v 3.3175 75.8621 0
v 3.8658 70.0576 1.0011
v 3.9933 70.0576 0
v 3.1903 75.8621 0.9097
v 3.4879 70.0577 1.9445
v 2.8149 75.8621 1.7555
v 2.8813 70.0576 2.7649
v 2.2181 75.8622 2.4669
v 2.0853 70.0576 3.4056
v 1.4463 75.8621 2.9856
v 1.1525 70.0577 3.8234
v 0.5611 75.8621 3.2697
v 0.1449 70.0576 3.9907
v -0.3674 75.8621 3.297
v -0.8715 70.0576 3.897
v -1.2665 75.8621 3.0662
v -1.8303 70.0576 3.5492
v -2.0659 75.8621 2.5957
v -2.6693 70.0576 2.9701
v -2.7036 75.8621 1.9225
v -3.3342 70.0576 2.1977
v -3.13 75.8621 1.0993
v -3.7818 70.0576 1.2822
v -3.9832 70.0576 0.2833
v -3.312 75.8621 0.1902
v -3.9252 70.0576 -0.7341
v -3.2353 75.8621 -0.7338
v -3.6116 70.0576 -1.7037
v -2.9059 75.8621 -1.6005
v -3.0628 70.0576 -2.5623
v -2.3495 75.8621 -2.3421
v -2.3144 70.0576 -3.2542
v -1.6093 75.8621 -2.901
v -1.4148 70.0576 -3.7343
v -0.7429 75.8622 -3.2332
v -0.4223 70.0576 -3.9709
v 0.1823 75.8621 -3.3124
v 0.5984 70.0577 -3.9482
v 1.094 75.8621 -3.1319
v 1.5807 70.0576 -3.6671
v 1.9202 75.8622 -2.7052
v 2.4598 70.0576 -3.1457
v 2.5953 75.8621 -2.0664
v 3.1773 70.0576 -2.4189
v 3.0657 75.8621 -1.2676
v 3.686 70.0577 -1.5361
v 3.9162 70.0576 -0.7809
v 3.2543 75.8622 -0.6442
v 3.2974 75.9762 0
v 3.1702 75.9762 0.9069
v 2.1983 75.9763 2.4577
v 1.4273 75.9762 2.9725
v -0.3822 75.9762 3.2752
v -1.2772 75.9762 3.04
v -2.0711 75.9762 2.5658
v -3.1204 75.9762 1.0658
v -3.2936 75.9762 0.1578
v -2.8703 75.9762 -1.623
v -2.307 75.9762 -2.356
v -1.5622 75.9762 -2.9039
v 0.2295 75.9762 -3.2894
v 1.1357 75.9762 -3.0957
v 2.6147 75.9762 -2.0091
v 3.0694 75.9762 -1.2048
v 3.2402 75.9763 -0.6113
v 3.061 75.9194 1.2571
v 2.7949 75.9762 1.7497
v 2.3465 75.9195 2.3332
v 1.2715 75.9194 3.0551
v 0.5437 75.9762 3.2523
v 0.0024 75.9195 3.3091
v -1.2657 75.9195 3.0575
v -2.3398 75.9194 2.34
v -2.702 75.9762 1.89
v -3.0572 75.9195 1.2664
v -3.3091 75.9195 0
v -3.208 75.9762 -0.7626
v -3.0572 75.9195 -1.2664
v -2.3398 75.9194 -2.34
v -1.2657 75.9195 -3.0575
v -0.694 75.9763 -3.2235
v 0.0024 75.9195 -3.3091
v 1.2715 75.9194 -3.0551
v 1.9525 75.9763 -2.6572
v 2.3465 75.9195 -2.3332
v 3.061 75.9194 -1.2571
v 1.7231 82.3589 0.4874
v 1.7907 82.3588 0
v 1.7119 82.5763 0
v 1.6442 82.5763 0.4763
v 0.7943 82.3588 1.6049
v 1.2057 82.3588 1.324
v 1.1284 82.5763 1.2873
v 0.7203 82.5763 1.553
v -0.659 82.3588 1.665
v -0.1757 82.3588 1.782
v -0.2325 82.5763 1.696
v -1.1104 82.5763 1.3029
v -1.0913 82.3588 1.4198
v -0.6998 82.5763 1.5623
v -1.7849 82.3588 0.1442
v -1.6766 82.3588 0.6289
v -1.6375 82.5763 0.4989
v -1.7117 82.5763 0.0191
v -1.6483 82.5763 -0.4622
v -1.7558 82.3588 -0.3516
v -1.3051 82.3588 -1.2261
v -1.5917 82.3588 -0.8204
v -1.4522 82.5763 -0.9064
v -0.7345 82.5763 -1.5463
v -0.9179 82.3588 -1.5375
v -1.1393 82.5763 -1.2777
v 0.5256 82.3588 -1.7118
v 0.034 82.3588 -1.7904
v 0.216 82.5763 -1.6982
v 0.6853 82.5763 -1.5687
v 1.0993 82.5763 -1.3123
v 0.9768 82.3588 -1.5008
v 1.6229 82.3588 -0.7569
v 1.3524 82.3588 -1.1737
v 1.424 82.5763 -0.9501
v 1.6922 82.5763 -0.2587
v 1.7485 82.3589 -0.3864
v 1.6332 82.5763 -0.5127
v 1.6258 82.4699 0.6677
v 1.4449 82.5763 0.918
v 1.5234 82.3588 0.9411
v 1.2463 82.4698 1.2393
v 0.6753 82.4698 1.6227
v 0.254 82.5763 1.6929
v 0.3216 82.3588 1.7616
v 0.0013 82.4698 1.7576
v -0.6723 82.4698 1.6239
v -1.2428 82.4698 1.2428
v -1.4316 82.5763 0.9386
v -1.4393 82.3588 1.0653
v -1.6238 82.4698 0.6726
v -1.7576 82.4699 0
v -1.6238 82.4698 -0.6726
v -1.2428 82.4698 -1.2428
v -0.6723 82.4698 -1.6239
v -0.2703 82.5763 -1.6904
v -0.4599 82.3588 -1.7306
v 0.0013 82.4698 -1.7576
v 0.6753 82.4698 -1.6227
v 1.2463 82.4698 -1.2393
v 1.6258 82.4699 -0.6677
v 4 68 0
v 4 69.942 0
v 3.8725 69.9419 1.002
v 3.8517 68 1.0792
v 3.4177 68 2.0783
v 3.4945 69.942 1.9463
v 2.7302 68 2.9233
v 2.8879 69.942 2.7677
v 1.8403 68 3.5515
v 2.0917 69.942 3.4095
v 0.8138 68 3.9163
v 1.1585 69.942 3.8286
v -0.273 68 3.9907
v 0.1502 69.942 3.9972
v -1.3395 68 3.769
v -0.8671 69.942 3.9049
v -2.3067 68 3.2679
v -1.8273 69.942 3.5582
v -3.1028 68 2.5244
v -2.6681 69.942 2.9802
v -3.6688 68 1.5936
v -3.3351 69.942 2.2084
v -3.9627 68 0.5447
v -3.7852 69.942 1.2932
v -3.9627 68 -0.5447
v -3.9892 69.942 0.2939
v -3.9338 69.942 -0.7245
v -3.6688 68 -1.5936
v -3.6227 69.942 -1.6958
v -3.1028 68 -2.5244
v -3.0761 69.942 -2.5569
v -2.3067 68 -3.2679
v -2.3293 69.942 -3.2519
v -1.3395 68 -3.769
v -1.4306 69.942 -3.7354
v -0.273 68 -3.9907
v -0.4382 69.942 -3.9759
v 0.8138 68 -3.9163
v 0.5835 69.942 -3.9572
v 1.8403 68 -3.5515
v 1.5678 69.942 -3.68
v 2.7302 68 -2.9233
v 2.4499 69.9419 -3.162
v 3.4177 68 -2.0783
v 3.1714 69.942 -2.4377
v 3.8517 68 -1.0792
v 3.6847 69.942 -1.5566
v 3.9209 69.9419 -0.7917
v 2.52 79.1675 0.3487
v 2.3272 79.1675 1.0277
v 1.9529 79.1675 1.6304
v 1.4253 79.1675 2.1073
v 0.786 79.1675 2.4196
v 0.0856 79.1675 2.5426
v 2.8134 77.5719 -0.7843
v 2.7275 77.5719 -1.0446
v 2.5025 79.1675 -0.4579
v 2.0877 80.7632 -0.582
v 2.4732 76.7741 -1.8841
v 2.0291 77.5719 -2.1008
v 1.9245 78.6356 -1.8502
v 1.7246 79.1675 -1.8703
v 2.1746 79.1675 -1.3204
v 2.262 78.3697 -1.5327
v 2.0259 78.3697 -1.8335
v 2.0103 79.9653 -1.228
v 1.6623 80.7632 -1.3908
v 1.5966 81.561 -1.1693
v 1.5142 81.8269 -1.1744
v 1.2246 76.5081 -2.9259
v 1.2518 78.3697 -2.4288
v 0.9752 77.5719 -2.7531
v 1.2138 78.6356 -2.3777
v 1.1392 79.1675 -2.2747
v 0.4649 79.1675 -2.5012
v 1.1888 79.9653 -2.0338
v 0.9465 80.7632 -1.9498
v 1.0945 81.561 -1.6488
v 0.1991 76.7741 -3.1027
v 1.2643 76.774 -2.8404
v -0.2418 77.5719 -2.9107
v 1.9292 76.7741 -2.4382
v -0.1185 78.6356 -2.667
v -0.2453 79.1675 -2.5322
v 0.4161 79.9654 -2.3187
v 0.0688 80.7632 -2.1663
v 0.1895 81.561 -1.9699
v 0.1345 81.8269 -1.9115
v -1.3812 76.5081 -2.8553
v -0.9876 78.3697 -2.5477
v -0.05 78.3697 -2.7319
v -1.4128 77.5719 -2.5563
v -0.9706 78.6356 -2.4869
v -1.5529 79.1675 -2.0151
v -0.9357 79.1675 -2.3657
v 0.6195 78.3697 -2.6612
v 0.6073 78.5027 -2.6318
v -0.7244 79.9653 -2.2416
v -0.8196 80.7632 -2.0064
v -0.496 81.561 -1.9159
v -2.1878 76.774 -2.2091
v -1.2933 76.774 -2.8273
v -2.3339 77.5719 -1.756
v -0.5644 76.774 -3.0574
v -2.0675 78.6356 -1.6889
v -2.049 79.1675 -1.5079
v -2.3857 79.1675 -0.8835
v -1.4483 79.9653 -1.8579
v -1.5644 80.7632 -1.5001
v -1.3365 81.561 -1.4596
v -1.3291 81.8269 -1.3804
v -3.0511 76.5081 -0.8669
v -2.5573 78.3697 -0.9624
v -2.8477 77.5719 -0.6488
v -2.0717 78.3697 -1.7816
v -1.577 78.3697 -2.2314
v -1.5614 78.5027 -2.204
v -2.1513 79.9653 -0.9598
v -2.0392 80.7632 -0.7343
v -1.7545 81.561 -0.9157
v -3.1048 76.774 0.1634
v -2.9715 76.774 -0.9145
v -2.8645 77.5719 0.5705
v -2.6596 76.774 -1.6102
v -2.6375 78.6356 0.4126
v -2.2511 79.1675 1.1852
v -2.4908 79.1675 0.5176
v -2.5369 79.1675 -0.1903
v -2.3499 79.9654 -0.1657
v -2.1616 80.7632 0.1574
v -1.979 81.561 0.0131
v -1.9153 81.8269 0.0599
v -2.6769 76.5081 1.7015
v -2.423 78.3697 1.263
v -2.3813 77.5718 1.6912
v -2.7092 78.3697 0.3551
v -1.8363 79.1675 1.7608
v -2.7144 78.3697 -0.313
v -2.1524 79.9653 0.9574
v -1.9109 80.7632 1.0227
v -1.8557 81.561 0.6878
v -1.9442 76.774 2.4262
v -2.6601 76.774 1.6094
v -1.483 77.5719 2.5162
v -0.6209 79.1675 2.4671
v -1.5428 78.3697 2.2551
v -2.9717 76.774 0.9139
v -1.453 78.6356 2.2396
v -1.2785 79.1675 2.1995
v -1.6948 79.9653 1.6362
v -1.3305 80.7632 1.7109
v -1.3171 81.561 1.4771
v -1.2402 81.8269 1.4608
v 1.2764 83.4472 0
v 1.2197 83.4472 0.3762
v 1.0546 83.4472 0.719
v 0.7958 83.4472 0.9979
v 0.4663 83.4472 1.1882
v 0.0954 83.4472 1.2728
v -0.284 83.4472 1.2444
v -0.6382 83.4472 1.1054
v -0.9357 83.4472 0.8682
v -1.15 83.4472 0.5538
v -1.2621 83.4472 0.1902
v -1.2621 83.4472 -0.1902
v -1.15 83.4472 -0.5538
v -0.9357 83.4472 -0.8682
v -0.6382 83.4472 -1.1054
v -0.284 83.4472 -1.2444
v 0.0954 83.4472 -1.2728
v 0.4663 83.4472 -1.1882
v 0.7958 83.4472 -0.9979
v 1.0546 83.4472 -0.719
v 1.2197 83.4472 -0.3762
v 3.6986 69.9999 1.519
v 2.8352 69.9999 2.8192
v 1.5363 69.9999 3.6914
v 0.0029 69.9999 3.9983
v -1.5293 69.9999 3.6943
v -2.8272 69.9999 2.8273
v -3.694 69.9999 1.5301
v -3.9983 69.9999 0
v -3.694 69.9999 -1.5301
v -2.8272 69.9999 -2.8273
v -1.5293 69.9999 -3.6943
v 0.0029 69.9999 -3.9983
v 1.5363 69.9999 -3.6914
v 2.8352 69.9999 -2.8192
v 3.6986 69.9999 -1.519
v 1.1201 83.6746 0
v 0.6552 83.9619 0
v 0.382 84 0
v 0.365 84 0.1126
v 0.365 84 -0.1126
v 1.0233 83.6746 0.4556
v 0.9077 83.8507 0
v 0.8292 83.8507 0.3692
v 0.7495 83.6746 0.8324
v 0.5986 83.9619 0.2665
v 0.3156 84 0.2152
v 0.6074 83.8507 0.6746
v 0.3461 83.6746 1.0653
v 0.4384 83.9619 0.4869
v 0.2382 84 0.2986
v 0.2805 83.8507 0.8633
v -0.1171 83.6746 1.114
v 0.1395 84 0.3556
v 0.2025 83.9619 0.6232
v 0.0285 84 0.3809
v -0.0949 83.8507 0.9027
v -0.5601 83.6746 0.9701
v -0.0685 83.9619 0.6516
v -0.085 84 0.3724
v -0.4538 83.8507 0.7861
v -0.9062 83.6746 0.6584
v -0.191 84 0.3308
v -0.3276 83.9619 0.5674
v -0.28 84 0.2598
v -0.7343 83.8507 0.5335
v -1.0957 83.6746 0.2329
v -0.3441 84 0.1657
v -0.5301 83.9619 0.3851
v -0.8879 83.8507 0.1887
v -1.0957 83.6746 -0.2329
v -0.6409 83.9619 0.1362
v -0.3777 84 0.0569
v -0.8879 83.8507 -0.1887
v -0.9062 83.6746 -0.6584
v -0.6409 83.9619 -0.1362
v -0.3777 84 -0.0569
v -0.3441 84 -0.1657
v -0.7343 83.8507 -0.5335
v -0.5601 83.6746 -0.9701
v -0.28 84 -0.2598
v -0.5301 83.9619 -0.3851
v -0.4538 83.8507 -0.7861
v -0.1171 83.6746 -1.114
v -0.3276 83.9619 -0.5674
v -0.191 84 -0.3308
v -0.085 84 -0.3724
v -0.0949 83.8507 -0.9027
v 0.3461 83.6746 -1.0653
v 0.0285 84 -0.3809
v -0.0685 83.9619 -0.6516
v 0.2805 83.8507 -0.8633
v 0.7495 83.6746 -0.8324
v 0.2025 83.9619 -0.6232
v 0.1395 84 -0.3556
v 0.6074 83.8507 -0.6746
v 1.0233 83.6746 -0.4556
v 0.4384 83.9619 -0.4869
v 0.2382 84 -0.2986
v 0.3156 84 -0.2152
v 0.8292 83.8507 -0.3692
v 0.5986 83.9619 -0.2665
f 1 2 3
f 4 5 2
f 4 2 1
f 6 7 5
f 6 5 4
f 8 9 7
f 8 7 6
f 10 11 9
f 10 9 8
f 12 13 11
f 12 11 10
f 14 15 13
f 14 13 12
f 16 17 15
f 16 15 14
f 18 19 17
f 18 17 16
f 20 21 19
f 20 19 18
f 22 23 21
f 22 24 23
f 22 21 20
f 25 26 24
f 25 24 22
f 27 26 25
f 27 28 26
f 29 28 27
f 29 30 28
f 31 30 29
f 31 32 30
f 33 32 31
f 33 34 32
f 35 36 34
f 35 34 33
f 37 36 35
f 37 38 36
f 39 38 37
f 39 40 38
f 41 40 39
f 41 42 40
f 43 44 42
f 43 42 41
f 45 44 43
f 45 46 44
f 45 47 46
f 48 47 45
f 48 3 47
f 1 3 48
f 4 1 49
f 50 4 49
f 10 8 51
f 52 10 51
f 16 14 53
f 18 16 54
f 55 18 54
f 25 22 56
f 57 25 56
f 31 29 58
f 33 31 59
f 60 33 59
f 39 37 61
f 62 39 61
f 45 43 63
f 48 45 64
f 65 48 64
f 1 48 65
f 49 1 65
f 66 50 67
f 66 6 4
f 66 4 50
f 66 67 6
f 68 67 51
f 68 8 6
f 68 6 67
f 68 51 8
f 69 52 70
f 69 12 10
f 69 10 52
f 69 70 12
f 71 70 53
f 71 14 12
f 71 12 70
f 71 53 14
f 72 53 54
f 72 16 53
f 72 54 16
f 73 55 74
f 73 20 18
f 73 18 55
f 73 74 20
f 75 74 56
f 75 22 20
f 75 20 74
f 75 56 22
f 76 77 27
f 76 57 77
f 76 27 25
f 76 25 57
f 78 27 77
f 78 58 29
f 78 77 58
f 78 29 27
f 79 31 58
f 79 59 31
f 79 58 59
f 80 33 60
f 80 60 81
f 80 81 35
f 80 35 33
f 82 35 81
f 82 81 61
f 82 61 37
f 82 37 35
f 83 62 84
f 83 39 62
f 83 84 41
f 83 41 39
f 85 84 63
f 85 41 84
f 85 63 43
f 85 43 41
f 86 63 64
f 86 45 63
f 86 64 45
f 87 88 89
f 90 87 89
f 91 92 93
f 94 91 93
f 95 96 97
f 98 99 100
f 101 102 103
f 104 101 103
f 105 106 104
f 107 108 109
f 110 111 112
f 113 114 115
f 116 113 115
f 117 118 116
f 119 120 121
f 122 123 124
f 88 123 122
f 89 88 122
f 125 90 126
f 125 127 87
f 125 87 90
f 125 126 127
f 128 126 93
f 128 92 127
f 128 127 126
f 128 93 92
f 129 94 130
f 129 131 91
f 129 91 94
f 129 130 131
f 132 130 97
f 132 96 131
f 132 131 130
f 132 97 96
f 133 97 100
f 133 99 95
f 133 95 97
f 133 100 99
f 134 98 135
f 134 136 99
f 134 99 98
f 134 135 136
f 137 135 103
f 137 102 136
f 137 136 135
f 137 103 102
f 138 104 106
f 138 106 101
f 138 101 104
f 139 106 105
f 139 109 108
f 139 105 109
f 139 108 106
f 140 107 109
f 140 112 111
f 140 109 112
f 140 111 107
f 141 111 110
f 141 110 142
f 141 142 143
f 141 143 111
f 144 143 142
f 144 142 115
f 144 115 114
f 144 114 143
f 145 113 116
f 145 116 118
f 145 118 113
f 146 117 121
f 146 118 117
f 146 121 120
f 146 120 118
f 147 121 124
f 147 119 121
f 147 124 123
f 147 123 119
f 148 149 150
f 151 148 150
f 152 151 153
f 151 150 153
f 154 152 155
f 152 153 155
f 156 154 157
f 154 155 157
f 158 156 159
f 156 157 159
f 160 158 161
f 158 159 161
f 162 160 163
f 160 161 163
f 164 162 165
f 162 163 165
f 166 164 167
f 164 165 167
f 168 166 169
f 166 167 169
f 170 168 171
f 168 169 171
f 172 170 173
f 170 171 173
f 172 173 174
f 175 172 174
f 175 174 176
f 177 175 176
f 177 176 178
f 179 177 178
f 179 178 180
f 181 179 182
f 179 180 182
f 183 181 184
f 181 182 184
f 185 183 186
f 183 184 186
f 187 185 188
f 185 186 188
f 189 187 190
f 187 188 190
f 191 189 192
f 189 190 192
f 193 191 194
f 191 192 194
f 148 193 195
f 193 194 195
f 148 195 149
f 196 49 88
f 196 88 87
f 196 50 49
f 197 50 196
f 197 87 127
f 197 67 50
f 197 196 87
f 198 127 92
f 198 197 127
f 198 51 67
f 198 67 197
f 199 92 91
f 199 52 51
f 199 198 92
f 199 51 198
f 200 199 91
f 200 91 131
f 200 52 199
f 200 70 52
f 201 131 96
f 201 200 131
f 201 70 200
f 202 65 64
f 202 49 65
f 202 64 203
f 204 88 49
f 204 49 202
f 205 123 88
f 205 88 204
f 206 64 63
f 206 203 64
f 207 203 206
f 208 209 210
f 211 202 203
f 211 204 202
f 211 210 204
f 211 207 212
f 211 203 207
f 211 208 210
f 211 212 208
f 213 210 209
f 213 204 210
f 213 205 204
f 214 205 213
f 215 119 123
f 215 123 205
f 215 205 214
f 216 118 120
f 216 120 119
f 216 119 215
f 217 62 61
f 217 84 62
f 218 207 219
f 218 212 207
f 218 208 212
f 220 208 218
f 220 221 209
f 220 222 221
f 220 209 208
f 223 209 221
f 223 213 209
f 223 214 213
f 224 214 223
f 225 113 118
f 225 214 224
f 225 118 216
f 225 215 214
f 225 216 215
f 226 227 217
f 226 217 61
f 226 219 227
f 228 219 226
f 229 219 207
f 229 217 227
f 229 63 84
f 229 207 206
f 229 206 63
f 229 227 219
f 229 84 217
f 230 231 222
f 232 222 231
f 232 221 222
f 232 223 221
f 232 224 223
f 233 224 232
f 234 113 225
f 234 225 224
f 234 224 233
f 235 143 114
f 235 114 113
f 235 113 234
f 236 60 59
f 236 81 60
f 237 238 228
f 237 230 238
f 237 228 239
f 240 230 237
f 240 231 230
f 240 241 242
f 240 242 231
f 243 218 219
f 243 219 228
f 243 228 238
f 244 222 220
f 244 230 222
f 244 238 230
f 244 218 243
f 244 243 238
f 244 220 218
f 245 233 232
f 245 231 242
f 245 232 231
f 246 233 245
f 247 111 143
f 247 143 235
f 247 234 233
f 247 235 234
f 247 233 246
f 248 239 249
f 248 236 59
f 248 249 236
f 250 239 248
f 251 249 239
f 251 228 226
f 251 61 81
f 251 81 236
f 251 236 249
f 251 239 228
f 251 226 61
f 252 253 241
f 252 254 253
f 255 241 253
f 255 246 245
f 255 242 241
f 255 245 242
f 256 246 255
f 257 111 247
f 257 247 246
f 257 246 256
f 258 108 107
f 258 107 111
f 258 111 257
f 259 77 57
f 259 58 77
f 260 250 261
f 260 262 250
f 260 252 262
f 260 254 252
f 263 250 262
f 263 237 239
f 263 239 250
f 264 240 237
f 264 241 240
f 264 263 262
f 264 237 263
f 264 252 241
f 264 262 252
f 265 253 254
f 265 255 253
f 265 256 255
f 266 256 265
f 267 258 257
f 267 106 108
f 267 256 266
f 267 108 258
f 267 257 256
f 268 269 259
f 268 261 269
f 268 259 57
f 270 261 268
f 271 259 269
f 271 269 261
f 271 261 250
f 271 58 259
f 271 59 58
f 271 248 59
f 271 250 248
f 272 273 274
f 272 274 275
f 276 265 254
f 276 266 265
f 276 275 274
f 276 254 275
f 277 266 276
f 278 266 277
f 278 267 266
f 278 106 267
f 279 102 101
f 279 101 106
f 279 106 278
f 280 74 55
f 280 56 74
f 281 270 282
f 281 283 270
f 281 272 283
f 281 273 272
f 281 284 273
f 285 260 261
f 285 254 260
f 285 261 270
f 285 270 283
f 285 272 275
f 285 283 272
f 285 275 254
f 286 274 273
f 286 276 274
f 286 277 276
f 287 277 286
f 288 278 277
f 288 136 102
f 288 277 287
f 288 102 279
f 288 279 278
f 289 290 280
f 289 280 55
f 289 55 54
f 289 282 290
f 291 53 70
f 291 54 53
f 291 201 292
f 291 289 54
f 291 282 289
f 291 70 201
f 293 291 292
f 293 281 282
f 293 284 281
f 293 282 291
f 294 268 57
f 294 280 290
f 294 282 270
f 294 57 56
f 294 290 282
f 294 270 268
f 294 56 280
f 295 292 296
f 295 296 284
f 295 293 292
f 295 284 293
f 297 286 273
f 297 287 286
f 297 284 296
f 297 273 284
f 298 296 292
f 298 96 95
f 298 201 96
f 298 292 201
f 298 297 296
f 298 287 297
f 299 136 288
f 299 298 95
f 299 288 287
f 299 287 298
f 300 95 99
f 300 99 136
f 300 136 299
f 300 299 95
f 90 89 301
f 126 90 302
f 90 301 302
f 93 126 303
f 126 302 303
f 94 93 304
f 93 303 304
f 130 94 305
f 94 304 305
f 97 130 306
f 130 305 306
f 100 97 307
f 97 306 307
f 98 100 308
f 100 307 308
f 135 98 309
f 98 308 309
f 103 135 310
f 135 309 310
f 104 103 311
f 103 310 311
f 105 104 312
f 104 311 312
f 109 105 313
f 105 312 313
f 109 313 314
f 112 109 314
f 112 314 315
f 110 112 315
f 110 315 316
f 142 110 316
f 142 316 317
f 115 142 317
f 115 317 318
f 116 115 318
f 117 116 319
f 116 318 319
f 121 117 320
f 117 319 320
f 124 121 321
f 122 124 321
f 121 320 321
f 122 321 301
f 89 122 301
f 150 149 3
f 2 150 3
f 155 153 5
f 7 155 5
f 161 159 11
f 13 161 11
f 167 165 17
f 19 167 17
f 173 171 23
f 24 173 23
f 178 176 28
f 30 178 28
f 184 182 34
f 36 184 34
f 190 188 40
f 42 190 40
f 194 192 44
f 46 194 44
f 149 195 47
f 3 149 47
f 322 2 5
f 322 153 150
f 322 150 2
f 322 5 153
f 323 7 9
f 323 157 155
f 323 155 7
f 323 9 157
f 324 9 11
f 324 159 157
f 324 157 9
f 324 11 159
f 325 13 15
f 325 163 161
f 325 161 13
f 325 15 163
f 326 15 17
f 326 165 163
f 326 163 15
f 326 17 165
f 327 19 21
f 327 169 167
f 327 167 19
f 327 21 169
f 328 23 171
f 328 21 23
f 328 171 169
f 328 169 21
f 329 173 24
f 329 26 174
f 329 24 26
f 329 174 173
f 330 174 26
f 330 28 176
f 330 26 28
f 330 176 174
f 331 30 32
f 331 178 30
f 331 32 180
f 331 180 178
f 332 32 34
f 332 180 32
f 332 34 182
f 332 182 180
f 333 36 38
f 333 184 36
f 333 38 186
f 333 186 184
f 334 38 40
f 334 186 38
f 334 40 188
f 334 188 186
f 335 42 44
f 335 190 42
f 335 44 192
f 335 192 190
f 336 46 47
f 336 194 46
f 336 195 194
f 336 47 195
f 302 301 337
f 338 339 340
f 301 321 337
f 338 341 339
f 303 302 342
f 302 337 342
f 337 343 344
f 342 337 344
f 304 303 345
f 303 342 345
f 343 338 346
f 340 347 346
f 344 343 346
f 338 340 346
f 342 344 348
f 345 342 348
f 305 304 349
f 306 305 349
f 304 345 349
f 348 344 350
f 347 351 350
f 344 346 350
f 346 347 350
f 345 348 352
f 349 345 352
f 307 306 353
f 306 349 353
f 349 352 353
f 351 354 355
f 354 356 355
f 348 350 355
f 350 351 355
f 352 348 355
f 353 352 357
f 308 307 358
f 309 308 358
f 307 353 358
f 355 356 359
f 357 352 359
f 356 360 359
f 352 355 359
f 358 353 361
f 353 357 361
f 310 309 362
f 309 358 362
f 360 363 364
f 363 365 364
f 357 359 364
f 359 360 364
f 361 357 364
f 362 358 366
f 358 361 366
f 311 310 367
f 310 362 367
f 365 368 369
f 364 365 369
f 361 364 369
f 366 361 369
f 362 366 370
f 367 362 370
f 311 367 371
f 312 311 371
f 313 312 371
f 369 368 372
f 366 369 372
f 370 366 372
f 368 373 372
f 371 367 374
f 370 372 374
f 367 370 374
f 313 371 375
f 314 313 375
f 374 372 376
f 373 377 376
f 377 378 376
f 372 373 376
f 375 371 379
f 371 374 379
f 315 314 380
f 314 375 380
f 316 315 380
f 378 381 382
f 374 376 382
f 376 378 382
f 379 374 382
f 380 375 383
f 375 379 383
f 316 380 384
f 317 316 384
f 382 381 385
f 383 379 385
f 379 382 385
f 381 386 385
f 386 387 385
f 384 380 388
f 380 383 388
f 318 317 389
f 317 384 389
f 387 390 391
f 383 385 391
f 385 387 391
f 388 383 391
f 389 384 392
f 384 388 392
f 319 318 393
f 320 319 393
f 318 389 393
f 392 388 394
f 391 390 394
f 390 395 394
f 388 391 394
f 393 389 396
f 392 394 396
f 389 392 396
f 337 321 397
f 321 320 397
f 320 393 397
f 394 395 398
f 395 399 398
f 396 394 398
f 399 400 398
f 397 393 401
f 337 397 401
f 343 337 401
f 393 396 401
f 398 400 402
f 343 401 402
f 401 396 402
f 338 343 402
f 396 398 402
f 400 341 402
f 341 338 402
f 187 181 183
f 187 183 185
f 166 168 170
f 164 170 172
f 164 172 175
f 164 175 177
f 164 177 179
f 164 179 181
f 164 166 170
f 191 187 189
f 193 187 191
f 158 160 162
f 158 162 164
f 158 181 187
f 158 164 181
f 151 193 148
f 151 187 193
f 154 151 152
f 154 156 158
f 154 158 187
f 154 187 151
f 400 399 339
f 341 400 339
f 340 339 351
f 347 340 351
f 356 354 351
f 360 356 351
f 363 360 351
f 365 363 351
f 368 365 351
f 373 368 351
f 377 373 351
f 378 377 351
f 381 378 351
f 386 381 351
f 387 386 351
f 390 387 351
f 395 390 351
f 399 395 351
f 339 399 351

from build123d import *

# Parameters (mm, degrees)
CYLINDER046_R     = 4
CYLINDER046_DEPTH = 16
CHAMFER010_SIZE2  = 3
CHAMFER010_SIZE   = 6
CHAMFER011_SIZE   = 5
CHAMFER012_SIZE   = 3
FILLET003_R       = 1


with BuildPart() as part:
    # Cylinder046 → Cylinder046 (new body)
    with BuildSketch(Plane.XZ.offset(-60)):
        Circle(CYLINDER046_R)
    extrude(amount=CYLINDER046_DEPTH)

    # Chamfer010
    chamfer010_edges = [part.edges().sort_by_distance(p)[0] for p in [
        (-4, 60, 0),
    ]]
    chamfer010_side = part.faces().sort_by_distance((-4, 52, 0))[0]
    chamfer(chamfer010_edges, length=CHAMFER010_SIZE, length2=CHAMFER010_SIZE2, reference=chamfer010_side)

    # Chamfer011
    chamfer011_edges = [part.edges().sort_by_distance(p)[0] for p in [
        (-4, 54, 0),
    ]]
    chamfer(chamfer011_edges, length=CHAMFER011_SIZE)

    # Chamfer012
    chamfer012_edges = [part.edges().sort_by_distance(p)[0] for p in [
        (-3.999983, 49, 0),
    ]]
    chamfer(chamfer012_edges, length=CHAMFER012_SIZE)

    # Fillet003
    fillet003_edges = [part.edges().sort_by_distance(p)[0] for p in [
        (-4, 46, 0),
        (-3.310727, 51.919748, 0),
        (-1.763924, 58.472136, 0),
        (-1, 60, 0),
    ]]
    fillet(fillet003_edges, radius=FILLET003_R)


with BuildPart() as part_1:
    # Fillet003 placement: moved
    add(part.part.moved(Location((0, 24, 0))))


solid = part_1.part
